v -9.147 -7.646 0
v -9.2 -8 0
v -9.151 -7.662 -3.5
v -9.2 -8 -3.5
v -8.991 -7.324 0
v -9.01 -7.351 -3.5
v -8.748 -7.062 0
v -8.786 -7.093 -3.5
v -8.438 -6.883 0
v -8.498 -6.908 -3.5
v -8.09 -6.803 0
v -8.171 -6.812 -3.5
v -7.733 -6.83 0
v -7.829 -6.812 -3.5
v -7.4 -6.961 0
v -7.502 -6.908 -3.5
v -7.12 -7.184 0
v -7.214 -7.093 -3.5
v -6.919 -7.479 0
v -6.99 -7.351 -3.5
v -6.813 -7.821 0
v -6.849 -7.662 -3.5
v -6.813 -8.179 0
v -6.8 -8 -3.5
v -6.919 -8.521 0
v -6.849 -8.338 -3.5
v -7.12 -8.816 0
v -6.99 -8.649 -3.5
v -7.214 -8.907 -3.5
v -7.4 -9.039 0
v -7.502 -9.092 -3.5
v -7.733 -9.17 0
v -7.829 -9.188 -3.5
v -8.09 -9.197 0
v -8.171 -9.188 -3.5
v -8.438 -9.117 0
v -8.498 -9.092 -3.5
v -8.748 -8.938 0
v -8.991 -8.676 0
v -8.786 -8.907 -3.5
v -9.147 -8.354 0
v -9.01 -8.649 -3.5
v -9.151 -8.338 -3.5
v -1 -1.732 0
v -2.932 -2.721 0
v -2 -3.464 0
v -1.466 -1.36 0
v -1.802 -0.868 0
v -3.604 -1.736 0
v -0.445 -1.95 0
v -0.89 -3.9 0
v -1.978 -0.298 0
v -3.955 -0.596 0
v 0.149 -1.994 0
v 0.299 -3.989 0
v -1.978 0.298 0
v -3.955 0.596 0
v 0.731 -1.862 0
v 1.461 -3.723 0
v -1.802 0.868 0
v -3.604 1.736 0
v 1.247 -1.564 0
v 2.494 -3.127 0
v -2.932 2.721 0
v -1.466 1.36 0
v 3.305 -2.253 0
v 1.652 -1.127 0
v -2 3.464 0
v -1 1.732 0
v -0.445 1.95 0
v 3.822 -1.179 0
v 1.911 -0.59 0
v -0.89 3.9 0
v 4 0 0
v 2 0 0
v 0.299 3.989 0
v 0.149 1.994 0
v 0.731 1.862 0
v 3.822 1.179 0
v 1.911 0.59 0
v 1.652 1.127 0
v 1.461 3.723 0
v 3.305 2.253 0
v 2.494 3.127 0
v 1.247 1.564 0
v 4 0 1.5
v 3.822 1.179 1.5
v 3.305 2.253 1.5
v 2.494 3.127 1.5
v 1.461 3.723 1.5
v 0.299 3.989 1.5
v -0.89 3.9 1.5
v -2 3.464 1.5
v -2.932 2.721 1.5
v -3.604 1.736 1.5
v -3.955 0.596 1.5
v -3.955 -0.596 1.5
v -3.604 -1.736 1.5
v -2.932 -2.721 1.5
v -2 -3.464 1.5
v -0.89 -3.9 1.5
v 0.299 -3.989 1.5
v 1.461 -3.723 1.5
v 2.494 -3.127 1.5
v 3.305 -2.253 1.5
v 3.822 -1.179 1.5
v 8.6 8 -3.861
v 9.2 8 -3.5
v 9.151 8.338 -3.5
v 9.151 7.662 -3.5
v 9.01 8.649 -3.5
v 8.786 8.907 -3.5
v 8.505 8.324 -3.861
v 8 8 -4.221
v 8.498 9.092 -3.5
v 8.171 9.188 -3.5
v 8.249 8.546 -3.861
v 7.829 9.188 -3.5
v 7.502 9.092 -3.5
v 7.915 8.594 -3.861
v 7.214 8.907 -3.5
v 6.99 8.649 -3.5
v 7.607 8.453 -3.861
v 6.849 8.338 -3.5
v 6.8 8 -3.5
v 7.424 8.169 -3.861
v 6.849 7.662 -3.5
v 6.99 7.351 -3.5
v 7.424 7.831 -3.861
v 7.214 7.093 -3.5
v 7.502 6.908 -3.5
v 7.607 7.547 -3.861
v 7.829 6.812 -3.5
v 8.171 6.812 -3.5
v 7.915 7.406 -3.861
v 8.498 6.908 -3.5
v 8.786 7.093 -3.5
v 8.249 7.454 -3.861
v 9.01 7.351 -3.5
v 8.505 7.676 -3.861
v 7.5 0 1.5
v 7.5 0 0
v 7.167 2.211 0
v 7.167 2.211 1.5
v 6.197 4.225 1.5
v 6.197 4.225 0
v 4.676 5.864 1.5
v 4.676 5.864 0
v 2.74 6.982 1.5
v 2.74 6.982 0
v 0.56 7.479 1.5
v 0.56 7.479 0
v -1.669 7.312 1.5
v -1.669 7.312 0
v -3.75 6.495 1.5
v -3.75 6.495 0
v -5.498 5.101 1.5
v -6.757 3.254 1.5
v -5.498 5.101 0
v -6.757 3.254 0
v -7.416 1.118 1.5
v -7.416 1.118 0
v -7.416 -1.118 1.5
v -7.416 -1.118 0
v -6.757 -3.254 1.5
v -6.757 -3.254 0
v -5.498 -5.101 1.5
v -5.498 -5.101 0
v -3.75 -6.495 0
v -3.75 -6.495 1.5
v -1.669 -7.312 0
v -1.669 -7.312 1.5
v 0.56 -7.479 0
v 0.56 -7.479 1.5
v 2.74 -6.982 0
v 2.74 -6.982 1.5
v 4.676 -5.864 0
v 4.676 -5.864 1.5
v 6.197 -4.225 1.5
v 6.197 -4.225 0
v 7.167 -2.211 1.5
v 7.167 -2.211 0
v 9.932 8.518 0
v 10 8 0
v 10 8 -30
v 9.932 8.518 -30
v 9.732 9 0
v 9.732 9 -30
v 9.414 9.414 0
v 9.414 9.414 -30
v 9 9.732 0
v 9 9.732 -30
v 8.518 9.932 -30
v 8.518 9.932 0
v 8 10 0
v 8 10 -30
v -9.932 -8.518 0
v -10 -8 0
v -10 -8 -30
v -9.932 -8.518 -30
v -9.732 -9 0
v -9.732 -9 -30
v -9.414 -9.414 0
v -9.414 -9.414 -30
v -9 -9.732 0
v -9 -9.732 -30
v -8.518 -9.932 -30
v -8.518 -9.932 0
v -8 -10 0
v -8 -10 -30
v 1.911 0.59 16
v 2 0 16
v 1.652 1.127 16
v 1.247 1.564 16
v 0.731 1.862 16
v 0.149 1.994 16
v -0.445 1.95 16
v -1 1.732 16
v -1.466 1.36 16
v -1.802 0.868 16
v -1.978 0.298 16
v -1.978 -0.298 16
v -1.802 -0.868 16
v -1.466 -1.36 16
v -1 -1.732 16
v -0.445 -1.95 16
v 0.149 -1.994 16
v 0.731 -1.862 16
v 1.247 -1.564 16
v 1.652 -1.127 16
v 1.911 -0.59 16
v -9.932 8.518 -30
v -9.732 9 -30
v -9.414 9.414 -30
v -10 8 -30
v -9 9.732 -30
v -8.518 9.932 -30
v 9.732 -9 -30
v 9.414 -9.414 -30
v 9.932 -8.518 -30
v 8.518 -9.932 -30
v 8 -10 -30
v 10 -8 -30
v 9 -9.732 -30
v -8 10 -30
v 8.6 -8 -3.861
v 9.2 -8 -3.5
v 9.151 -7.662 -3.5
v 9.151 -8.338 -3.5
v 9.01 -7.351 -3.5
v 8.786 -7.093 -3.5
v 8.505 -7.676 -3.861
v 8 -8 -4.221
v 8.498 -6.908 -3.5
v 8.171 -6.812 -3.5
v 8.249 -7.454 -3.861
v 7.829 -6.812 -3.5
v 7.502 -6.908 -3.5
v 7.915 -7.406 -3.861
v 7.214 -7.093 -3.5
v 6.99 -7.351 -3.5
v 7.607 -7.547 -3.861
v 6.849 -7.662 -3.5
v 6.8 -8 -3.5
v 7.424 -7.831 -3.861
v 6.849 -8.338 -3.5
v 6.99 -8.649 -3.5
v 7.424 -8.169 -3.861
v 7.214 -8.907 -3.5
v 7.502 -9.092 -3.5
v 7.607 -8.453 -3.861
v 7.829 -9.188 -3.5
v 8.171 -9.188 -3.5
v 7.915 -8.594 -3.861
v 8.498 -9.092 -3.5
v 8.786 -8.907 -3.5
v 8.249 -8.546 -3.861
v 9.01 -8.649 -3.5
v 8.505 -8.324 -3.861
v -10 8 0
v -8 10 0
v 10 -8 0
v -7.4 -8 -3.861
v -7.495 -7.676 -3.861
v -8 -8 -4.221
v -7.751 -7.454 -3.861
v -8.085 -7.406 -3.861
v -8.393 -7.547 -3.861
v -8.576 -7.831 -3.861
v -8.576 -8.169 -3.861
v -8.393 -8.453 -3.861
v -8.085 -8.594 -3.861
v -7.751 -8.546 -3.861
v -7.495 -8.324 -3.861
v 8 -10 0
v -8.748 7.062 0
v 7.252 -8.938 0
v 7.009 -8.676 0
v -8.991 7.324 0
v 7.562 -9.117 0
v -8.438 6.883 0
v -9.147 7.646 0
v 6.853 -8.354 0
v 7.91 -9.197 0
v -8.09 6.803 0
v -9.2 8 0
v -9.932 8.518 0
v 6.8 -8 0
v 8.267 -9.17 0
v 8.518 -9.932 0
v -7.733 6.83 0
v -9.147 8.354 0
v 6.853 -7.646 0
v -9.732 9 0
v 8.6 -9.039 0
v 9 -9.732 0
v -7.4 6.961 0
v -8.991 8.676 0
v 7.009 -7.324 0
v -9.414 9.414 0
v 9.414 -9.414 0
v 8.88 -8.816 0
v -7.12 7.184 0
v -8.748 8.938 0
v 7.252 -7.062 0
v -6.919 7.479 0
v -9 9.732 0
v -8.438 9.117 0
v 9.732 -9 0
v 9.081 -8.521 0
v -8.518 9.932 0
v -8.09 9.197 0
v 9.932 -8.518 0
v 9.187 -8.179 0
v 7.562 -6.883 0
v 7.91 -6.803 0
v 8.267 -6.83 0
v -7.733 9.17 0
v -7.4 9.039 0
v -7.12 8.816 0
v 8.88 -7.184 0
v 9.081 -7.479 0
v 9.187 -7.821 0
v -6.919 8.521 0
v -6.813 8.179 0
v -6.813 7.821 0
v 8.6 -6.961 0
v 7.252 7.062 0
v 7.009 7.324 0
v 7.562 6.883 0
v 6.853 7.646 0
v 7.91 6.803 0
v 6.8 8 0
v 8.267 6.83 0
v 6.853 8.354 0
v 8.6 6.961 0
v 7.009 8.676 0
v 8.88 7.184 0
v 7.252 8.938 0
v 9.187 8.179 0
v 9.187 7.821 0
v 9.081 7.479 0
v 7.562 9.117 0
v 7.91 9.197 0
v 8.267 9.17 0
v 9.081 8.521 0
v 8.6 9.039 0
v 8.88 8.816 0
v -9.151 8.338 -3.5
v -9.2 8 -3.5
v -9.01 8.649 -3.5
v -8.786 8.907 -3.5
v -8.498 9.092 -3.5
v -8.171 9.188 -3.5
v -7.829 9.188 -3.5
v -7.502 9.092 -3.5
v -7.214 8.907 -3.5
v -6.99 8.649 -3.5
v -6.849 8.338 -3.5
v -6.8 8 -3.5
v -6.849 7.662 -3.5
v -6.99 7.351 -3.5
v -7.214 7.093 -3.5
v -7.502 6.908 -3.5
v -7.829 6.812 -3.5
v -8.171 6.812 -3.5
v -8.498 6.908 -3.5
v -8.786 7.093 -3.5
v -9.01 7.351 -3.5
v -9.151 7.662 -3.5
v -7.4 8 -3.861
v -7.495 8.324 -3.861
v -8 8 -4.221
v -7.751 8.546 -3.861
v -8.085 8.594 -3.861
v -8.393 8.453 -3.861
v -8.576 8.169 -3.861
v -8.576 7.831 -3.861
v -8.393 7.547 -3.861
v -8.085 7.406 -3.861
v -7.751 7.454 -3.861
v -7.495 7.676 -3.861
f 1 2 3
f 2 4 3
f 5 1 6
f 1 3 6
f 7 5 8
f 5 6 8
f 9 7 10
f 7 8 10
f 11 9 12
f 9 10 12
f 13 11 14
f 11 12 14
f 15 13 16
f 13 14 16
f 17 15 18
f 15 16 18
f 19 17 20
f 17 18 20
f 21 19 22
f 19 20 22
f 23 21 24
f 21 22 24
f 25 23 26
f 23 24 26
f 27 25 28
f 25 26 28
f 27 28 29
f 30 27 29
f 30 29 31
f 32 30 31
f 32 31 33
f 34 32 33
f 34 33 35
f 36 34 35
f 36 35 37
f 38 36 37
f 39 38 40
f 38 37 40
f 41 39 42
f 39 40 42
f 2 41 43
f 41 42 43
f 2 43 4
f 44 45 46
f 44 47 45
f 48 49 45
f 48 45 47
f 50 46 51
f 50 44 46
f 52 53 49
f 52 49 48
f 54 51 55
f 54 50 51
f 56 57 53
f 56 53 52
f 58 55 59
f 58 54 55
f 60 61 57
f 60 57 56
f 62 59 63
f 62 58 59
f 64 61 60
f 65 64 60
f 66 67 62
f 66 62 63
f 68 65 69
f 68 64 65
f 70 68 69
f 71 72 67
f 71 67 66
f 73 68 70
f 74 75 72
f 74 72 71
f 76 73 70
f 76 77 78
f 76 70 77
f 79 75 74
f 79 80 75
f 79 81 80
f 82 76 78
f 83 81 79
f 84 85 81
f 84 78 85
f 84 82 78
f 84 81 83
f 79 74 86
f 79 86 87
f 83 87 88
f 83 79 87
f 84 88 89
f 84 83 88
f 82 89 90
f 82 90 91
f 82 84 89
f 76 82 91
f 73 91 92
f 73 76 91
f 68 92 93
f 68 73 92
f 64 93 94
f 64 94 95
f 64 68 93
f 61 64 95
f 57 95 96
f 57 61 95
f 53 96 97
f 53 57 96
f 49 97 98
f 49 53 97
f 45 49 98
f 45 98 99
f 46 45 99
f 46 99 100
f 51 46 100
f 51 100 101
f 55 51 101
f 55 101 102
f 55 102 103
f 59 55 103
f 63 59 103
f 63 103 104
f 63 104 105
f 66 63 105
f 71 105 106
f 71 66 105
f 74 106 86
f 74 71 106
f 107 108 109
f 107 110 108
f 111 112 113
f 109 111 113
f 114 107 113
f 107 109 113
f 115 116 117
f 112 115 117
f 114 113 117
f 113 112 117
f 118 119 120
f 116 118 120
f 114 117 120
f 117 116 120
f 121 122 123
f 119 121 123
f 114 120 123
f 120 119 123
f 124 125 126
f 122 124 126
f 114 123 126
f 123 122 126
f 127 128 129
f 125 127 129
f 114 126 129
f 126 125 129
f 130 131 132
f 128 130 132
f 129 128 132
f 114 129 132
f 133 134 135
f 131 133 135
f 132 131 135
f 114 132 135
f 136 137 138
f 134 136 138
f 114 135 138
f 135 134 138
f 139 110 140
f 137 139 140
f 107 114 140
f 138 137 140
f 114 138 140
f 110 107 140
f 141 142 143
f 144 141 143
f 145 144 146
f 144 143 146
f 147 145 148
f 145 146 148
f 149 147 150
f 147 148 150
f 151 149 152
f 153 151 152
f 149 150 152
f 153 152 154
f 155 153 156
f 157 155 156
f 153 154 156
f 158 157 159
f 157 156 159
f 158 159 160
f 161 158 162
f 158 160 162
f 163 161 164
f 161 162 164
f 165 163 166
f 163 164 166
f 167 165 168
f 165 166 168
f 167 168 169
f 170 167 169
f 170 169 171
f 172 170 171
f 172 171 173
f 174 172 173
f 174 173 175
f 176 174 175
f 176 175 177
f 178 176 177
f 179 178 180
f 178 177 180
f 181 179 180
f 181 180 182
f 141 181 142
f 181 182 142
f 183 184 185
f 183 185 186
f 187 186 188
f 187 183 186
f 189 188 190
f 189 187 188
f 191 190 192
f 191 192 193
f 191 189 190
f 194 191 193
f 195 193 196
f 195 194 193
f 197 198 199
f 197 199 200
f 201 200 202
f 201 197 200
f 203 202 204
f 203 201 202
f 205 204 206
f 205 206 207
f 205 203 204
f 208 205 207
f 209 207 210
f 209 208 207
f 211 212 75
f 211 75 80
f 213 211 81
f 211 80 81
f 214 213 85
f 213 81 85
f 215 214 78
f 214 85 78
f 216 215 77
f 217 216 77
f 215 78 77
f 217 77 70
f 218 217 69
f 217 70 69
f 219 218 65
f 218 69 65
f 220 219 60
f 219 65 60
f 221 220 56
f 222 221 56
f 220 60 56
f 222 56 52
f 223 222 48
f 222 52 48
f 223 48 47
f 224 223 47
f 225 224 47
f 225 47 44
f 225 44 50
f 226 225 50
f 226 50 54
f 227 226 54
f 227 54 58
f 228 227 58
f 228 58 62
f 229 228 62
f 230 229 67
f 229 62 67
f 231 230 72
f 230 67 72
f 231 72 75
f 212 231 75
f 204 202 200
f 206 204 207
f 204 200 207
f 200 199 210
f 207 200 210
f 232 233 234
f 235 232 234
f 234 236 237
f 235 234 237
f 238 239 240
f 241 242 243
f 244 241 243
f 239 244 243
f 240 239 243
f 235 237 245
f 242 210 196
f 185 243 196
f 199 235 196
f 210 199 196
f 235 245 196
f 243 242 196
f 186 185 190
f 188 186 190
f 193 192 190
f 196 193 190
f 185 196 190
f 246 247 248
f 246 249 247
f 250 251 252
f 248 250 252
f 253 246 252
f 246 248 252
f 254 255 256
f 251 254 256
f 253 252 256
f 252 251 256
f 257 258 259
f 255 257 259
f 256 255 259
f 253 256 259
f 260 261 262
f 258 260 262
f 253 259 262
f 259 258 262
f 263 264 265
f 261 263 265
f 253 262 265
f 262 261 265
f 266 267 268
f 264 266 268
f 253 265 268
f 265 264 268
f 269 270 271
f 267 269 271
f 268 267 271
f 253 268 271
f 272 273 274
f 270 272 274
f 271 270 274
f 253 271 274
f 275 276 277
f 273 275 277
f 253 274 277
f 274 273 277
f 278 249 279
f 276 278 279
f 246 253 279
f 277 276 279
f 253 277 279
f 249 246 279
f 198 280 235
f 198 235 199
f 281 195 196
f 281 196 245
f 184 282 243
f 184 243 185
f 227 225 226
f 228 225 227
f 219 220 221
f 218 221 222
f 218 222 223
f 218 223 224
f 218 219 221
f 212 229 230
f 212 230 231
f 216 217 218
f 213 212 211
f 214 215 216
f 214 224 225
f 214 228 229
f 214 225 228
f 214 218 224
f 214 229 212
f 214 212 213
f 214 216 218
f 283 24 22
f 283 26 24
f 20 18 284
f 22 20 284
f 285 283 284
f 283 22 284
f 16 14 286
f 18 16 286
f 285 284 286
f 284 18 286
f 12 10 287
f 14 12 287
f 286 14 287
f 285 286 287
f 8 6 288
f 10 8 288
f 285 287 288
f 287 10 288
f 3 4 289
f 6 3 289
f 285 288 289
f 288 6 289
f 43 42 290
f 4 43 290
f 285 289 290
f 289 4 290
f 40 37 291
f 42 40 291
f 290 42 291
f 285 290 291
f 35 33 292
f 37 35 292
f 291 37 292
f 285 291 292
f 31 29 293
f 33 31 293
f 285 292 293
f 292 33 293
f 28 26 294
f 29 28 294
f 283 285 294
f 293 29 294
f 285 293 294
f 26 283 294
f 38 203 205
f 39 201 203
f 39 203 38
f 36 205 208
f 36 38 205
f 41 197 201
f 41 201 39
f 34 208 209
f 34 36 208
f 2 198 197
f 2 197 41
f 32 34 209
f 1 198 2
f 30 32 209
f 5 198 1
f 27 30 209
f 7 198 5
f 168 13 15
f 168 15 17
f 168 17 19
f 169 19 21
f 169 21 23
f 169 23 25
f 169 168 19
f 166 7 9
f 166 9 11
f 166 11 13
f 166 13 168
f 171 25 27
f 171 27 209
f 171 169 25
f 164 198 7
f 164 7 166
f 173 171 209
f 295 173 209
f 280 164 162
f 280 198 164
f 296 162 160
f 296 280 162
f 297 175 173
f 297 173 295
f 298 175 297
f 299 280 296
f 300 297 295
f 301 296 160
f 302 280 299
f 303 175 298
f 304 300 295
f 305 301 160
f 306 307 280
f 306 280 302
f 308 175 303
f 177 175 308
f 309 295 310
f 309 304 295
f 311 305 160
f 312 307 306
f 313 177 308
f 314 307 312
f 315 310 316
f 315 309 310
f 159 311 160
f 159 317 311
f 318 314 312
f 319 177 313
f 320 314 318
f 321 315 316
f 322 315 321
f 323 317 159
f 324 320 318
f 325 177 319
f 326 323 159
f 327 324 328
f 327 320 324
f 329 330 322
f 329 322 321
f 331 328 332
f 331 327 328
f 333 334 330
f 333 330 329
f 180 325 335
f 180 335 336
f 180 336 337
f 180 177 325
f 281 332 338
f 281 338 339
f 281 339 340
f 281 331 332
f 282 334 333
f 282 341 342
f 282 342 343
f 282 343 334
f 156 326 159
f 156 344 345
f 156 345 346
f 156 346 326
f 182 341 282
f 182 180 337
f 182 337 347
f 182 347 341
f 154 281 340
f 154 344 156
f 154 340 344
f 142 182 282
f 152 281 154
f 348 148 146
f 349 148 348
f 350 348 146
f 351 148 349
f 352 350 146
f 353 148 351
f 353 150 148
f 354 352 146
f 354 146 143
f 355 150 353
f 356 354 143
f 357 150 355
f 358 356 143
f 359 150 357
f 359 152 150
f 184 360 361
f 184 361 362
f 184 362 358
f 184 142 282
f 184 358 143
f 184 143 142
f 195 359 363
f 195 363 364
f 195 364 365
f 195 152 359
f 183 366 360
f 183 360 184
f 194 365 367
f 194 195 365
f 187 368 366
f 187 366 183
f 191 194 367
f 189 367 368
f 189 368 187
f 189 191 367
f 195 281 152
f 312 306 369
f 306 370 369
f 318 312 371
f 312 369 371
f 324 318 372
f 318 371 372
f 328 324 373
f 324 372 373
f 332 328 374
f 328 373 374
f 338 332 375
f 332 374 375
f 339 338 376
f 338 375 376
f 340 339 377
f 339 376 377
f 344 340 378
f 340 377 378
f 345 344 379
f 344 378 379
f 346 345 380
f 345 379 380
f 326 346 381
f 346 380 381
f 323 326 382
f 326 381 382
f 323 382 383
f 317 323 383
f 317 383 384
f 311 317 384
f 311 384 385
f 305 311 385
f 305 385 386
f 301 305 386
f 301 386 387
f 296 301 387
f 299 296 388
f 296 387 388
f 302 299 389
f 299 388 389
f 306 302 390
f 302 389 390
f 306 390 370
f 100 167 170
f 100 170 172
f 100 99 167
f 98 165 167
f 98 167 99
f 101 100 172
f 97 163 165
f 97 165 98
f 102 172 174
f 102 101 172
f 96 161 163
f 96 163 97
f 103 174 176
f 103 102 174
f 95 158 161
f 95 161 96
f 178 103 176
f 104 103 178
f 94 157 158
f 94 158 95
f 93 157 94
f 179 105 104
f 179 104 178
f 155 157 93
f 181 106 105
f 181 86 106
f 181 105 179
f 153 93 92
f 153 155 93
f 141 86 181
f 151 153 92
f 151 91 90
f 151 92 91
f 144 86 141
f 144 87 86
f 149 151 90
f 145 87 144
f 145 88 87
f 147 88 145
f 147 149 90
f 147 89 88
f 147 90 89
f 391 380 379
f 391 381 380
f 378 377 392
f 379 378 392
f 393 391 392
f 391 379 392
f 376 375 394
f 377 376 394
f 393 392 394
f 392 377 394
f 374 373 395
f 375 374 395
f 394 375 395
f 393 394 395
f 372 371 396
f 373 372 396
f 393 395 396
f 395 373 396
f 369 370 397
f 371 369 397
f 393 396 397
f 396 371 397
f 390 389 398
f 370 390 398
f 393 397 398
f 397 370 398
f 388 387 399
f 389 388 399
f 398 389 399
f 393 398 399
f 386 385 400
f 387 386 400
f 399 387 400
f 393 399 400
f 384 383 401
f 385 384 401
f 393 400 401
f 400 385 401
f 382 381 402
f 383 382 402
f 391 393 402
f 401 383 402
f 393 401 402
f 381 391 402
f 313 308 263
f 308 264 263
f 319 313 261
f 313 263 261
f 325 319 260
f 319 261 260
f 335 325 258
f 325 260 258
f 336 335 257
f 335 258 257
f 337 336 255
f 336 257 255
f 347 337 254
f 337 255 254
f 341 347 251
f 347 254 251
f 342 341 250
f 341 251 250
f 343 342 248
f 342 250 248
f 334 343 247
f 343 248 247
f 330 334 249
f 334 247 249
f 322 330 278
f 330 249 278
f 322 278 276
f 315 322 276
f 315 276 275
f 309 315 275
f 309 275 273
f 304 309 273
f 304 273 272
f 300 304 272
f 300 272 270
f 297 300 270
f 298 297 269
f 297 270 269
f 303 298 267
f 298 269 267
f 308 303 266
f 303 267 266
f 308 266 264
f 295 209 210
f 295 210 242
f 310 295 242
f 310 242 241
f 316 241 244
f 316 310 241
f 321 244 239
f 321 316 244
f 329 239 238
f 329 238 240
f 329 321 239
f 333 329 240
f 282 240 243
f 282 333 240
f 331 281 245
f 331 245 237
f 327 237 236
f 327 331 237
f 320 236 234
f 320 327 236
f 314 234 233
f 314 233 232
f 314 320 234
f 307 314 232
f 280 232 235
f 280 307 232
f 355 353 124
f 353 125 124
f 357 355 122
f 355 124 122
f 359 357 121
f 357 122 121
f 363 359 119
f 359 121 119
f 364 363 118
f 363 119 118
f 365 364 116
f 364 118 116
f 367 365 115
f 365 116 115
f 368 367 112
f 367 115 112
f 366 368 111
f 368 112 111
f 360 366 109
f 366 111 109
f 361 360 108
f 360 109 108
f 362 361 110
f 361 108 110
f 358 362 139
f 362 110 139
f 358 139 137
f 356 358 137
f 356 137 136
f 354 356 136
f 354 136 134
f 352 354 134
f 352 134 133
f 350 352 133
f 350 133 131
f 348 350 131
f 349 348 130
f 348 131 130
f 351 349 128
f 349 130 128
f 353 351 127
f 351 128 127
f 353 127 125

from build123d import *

# Parameters (mm, degrees)
BOSS_EXTRUDE1_DEPTH      = 30
SKETCH3_R                = 7.5
SKETCH3_R_2              = 4
BOSS_EXTRUDE2_DEPTH      = 1.5
SKETCH4_R                = 2
BOSS_EXTRUDE3_DEPTH      = 16
M2_CLEARANCE_HOLE1_D     = 2.4
M2_CLEARANCE_HOLE1_DEPTH = 3.5
M2_CLEARANCE_HOLE1_TIP   = 0.721032743


with BuildPart() as part:
    # Sketch1 → Boss-Extrude1 (new body)
    with BuildSketch(Plane.XY):
        with BuildLine():
            Line((-8, -10), (8, -10))
            ThreePointArc((8, -10), (9.414213562, -9.414213562), (10, -8))
            Line((10, -8), (10, 8))
            ThreePointArc((10, 8), (9.414213562, 9.414213562), (8, 10))
            Line((8, 10), (-8, 10))
            ThreePointArc((-8, 10), (-9.414213562, 9.414213562), (-10, 8))
            Line((-10, 8), (-10, -8))
            ThreePointArc((-10, -8), (-9.414213562, -9.414213562), (-8, -10))
        make_face()
    extrude(amount=-BOSS_EXTRUDE1_DEPTH)

    # Sketch3 → Boss-Extrude2 (add)
    with BuildSketch(Plane.XY):
        Circle(SKETCH3_R)
        Circle(SKETCH3_R_2, mode=Mode.SUBTRACT)
    extrude(amount=BOSS_EXTRUDE2_DEPTH)

    # Sketch4 → Boss-Extrude3 (add)
    with BuildSketch(Plane.XY):
        Circle(SKETCH4_R)
    extrude(amount=BOSS_EXTRUDE3_DEPTH)

    # M2 Clearance Hole1
    with Locations(Plane.XY):
        with Locations((-8, 8), (8, 8), (8, -8), (-8, -8)):
            Hole(M2_CLEARANCE_HOLE1_D / 2, depth=M2_CLEARANCE_HOLE1_DEPTH)
            with Locations((0, 0, -(M2_CLEARANCE_HOLE1_DEPTH + M2_CLEARANCE_HOLE1_TIP / 2))):  # 118° drill point
                Cone(0, M2_CLEARANCE_HOLE1_D / 2, M2_CLEARANCE_HOLE1_TIP, mode=Mode.SUBTRACT)


solid = part.part
